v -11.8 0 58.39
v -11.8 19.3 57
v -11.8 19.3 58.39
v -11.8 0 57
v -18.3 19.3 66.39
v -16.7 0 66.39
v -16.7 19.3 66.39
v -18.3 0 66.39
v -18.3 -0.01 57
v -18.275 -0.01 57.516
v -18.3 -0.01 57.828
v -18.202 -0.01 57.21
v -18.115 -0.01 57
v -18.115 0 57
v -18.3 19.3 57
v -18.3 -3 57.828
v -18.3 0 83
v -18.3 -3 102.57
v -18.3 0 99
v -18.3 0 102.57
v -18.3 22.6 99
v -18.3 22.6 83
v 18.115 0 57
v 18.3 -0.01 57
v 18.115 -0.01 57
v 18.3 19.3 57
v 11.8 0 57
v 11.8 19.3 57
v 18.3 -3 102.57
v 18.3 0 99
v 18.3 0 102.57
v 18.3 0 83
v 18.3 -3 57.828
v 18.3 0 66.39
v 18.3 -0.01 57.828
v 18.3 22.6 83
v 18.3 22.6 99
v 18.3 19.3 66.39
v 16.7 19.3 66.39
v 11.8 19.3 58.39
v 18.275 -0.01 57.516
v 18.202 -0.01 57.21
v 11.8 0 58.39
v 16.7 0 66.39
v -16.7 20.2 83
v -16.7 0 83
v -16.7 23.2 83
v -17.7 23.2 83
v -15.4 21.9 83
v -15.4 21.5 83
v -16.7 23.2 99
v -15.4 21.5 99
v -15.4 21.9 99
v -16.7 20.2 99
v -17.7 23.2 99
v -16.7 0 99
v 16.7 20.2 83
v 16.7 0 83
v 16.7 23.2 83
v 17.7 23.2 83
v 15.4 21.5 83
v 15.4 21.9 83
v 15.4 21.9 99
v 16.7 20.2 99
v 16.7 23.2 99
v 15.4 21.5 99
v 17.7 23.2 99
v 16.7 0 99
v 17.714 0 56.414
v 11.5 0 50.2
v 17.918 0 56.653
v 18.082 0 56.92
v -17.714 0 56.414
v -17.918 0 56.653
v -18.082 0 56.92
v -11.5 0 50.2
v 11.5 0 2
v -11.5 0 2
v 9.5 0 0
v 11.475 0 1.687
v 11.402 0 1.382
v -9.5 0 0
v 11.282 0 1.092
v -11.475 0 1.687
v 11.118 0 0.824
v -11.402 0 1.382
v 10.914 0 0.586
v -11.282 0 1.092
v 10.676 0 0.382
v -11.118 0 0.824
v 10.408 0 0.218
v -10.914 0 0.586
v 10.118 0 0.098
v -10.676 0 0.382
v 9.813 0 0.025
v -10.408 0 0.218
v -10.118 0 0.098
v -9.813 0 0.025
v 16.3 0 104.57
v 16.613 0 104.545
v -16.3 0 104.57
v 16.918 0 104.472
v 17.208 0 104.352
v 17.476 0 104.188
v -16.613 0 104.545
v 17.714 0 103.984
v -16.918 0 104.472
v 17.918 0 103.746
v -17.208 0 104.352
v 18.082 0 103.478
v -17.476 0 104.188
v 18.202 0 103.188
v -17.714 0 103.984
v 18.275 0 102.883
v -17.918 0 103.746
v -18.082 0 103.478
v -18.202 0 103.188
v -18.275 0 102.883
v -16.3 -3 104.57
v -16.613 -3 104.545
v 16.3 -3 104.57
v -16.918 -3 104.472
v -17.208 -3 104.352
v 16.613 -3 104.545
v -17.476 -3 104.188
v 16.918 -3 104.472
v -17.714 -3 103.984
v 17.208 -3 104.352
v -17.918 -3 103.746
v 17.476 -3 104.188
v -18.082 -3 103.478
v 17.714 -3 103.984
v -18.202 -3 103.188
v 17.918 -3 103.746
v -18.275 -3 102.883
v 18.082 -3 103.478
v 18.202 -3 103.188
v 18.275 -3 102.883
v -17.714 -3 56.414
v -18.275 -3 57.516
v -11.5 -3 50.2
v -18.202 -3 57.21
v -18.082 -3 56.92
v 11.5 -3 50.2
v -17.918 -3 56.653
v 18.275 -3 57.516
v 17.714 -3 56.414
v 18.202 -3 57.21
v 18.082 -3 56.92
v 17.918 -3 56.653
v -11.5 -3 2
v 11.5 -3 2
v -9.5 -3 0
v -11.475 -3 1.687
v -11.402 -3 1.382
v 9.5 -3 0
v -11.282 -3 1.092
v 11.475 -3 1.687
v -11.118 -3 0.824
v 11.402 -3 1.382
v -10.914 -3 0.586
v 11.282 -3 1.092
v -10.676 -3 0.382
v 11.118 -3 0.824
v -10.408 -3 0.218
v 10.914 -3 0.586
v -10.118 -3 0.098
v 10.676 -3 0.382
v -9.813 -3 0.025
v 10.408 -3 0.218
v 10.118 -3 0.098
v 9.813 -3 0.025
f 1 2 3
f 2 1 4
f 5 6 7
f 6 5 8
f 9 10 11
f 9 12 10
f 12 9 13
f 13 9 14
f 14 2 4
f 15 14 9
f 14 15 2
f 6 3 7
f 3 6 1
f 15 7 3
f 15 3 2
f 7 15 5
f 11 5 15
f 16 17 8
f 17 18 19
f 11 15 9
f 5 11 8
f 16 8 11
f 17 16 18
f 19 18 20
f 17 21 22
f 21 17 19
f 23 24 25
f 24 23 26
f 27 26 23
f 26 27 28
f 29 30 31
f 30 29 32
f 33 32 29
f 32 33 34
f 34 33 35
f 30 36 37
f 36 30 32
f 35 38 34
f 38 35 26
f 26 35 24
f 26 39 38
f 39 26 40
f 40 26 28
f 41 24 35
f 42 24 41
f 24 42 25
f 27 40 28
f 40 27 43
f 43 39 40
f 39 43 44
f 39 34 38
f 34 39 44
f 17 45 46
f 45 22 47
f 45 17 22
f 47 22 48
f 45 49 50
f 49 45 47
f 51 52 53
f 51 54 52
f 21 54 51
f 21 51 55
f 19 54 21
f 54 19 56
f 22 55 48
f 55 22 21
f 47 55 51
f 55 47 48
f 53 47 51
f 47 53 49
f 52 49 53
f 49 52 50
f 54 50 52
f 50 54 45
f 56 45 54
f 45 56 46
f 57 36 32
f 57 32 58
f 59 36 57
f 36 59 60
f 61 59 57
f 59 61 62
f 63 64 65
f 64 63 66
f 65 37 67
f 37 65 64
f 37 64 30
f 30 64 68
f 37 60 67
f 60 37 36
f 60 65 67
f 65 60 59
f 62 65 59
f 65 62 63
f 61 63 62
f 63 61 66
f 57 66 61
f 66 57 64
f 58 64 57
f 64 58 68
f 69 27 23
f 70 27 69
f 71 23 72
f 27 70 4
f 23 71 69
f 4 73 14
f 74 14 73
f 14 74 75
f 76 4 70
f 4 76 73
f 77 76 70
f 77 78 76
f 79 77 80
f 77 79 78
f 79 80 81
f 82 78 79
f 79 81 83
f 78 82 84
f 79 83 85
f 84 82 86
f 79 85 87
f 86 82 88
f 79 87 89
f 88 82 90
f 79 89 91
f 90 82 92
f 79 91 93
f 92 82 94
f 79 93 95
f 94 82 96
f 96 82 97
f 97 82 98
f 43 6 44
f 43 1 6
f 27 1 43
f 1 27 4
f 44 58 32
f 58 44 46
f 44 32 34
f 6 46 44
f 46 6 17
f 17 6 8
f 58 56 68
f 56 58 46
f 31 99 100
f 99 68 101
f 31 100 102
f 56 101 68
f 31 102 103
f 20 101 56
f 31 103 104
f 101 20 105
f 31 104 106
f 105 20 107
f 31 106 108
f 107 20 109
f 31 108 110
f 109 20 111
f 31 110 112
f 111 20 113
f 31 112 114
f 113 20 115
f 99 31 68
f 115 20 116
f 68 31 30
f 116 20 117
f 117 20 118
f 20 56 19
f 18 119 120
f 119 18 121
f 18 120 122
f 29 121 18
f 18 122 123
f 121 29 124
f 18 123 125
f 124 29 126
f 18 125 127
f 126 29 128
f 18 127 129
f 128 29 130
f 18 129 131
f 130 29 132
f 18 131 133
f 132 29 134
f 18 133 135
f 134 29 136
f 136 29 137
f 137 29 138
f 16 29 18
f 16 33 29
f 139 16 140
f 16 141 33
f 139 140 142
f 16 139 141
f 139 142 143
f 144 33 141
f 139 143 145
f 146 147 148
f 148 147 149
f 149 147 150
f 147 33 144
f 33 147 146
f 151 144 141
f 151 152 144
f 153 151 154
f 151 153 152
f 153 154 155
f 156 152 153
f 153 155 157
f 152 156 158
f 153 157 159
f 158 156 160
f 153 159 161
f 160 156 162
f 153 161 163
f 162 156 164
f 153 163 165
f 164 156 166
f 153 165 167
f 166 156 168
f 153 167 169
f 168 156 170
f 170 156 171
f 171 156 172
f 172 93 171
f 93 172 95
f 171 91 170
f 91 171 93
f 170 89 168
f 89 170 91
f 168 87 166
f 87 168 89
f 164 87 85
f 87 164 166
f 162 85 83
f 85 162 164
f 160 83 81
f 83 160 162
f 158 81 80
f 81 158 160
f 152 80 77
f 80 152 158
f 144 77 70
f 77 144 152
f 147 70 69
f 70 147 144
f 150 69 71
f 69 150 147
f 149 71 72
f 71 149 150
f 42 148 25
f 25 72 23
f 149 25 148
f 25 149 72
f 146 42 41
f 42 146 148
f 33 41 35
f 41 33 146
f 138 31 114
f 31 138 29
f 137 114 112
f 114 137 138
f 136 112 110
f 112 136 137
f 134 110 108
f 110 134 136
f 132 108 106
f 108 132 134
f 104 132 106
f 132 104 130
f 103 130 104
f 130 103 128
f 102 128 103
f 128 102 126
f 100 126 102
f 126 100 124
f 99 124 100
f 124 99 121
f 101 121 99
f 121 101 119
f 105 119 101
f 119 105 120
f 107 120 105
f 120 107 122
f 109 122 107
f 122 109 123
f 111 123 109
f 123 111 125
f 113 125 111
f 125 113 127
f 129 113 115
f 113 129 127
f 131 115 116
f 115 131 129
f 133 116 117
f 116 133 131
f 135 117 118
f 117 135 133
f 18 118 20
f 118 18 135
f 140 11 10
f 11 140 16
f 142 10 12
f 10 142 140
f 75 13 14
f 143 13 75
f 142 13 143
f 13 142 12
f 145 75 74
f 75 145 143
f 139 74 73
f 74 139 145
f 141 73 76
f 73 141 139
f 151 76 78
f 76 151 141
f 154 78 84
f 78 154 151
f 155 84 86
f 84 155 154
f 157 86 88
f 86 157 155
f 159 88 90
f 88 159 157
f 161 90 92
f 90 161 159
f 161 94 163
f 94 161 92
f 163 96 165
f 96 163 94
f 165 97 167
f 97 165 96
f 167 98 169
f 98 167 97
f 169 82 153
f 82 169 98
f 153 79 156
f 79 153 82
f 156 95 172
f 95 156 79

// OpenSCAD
// ---------------------------------------------------------------------------
// Wall bracket for the CO2 sensor case (co2_sensor_case.scad)
// By Grant Emsley, https://www.emsley.ca
// Licensed CC BY 4.0: https://creativecommons.org/licenses/by/4.0/
//
// Needs co2_sensor_case.scad in the same folder: every case dimension comes
// from it, so a change to the case carries through to the bracket.
//
// The case has to come off the wall now and then to be calibrated outdoors,
// so the tape goes on this bracket instead of on the case.
//
//   plate  = 3 mm backplate, taped to the wall. Same outline as the case
//            (pod-wide at the bottom, wider at the chamber), so it hides
//            behind it. It also closes the case's back cable groove, so the
//            USB cable stays in it and leaves at the bottom edge as before.
//   seats  = two wedges under the case's shoulders (where the neck flares out
//            to the chamber). The case's weight and the cable's pull sit on
//            these, in shear, not on the snap.
//   arms   = two flex arms beside the chamber, above its side intakes, with a
//            hook over each side wall's front edge. Push the case straight
//            back onto the plate and they click over; pull it straight off
//            (45-degree hook faces both ways) to remove it.
//
// Nothing covers a vent: pod side and floor slots, neck bar slots, chamber
// intakes and the roof exhaust are all clear. The lids are untouched.
//
// Prints plate-down (tape face is the bed face), no supports.
// Frame and all case dimensions come from the case file (case frame: x across,
// y out from the wall with the case back at y = 0, z up, pod bottom z = 0).
// ---------------------------------------------------------------------------

include <co2_sensor_case.scad>
part = "none";       // silences the case file's own output
view = "bracket";    // bracket, assembly, print, test_snap, check_seated, check_sweep

$fn = 40;

pt     = 3.0;        // plate thickness
c_side = 0.3;        // case side to arm / seat, per side
c_seat = 0.2;        // shoulder to seat
arm_t  = 1.6;        // arm thickness across (the flexing direction)
arm_z  = [83, 99];   // arm span: above the chamber intakes (top at z_f + 7.5)
hook   = 1.0;        // hook reach over the side wall's front face (wall is 3.4)
play   = 0.2;        // case front face to the hook face, at the case's edge

xa     = ch_w/2 + c_side;            // arm inner face
xo     = xa + arm_t;                 // bracket outer face
rt     = c_side + hook;              // hook depth from the arm face
yh     = D + play - c_side;          // hook face starts here on the arm face
y_arm  = yh + 2*rt + 0.4;            // arm front end

// shoulder: bar outer face from (pod_w/2, z_cf - 8) to (ch_w/2, z_cf)
function flare(x) = (z_cf - 8) + (x - pod_w/2) * 8 / ((ch_w - pod_w)/2);
xs     = pod_w/2 + c_side;           // seat inner face
z_seat = 57;                         // seat bottom: clear of the top neck bar vent (z 54.1-56.1)
z_wide = z_seat - (xo - pod_w/2);    // plate starts widening here (45 degrees)

assert(z_seat > z_cf - 12 + 2, "seat would cover the neck bar vents");
assert(arm_z[0] > z_f + 5.5 + 2 + 2, "arms would cover the chamber intakes");
assert(arm_z[1] < z_top, "arms above the case top");
echo(str("Bracket: ", 2*xo, " W x ", z_top, " H; arm deflection to pass ", hook,
         " mm; seat top z ", flare(xs) - c_seat));

module rr2(p0, p1, r) {   // 2D rounded rectangle from corner p0 to corner p1
    translate(p0 + [r, r]) offset(r = r) square(p1 - p0 - [2*r, 2*r]);
}

module plate() {
    // outline in x/z, extruded back from y = 0
    translate([0, 0, 0]) rotate([90, 0, 0]) linear_extrude(pt)
        offset(r = 2) offset(delta = -2)
            polygon([[-pod_w/2, 0], [pod_w/2, 0], [pod_w/2, z_wide], [xo, z_seat],
                     [xo, z_top], [-xo, z_top], [-xo, z_seat], [-pod_w/2, z_wide]]);
}

module seats() {
    for (s = [-1, 1]) mirror([s < 0 ? 1 : 0, 0, 0])
        translate([0, D - 1, 0]) rotate([90, 0, 0]) linear_extrude(D - 1 + e)
            polygon([[xs, z_seat], [xs, flare(xs) - c_seat],
                     [xa, flare(xa) - c_seat], [xo, flare(xa) - c_seat], [xo, z_seat]]);
}

module arms() {
    for (s = [-1, 1]) mirror([s < 0 ? 1 : 0, 0, 0])
        translate([0, 0, arm_z[0]]) linear_extrude(arm_z[1] - arm_z[0])
            polygon([[xa, -e], [xo, -e], [xo, y_arm - 0.6], [xo - 0.6, y_arm],
                     [xa, y_arm],
                     [xa - rt, yh + rt + 0.4],     // 45-degree lead-in
                     [xa - rt, yh + rt],
                     [xa, yh]]);                   // 45-degree hook face
}

module bracket() { plate(); seats(); arms(); }

// The whole case as one solid, seated.
module case_solid() { body(); pod_lid(); esp_lid(); neck_cover(); }

// Print plate-down: the wall face (y = -pt) goes to the bed.
module print_pose() { translate([0, 0, pt]) rotate([90, 0, 0]) children(); }

if (view == "bracket") bracket();
else if (view == "assembly") { color("orange") bracket(); color("steelblue") case_solid(); }
else if (view == "print") print_pose() bracket();
// short slice through the arms, to try the snap on the real case first
else if (view == "test_snap") print_pose()
    intersection() { bracket(); translate([-50, -pt - 1, arm_z[0] - 2]) cube([100, 40, arm_z[1] - arm_z[0] + 4]); }
// both checks must render empty
else if (view == "check_seated") intersection() { bracket(); case_solid(); }
else if (view == "check_sweep")   // case pushed in from 30 mm out; arms excluded (they flex by design)
    intersection() { union() { plate(); seats(); }
                     minkowski() { case_solid(); cube([0.01, 30, 0.01]); } }
